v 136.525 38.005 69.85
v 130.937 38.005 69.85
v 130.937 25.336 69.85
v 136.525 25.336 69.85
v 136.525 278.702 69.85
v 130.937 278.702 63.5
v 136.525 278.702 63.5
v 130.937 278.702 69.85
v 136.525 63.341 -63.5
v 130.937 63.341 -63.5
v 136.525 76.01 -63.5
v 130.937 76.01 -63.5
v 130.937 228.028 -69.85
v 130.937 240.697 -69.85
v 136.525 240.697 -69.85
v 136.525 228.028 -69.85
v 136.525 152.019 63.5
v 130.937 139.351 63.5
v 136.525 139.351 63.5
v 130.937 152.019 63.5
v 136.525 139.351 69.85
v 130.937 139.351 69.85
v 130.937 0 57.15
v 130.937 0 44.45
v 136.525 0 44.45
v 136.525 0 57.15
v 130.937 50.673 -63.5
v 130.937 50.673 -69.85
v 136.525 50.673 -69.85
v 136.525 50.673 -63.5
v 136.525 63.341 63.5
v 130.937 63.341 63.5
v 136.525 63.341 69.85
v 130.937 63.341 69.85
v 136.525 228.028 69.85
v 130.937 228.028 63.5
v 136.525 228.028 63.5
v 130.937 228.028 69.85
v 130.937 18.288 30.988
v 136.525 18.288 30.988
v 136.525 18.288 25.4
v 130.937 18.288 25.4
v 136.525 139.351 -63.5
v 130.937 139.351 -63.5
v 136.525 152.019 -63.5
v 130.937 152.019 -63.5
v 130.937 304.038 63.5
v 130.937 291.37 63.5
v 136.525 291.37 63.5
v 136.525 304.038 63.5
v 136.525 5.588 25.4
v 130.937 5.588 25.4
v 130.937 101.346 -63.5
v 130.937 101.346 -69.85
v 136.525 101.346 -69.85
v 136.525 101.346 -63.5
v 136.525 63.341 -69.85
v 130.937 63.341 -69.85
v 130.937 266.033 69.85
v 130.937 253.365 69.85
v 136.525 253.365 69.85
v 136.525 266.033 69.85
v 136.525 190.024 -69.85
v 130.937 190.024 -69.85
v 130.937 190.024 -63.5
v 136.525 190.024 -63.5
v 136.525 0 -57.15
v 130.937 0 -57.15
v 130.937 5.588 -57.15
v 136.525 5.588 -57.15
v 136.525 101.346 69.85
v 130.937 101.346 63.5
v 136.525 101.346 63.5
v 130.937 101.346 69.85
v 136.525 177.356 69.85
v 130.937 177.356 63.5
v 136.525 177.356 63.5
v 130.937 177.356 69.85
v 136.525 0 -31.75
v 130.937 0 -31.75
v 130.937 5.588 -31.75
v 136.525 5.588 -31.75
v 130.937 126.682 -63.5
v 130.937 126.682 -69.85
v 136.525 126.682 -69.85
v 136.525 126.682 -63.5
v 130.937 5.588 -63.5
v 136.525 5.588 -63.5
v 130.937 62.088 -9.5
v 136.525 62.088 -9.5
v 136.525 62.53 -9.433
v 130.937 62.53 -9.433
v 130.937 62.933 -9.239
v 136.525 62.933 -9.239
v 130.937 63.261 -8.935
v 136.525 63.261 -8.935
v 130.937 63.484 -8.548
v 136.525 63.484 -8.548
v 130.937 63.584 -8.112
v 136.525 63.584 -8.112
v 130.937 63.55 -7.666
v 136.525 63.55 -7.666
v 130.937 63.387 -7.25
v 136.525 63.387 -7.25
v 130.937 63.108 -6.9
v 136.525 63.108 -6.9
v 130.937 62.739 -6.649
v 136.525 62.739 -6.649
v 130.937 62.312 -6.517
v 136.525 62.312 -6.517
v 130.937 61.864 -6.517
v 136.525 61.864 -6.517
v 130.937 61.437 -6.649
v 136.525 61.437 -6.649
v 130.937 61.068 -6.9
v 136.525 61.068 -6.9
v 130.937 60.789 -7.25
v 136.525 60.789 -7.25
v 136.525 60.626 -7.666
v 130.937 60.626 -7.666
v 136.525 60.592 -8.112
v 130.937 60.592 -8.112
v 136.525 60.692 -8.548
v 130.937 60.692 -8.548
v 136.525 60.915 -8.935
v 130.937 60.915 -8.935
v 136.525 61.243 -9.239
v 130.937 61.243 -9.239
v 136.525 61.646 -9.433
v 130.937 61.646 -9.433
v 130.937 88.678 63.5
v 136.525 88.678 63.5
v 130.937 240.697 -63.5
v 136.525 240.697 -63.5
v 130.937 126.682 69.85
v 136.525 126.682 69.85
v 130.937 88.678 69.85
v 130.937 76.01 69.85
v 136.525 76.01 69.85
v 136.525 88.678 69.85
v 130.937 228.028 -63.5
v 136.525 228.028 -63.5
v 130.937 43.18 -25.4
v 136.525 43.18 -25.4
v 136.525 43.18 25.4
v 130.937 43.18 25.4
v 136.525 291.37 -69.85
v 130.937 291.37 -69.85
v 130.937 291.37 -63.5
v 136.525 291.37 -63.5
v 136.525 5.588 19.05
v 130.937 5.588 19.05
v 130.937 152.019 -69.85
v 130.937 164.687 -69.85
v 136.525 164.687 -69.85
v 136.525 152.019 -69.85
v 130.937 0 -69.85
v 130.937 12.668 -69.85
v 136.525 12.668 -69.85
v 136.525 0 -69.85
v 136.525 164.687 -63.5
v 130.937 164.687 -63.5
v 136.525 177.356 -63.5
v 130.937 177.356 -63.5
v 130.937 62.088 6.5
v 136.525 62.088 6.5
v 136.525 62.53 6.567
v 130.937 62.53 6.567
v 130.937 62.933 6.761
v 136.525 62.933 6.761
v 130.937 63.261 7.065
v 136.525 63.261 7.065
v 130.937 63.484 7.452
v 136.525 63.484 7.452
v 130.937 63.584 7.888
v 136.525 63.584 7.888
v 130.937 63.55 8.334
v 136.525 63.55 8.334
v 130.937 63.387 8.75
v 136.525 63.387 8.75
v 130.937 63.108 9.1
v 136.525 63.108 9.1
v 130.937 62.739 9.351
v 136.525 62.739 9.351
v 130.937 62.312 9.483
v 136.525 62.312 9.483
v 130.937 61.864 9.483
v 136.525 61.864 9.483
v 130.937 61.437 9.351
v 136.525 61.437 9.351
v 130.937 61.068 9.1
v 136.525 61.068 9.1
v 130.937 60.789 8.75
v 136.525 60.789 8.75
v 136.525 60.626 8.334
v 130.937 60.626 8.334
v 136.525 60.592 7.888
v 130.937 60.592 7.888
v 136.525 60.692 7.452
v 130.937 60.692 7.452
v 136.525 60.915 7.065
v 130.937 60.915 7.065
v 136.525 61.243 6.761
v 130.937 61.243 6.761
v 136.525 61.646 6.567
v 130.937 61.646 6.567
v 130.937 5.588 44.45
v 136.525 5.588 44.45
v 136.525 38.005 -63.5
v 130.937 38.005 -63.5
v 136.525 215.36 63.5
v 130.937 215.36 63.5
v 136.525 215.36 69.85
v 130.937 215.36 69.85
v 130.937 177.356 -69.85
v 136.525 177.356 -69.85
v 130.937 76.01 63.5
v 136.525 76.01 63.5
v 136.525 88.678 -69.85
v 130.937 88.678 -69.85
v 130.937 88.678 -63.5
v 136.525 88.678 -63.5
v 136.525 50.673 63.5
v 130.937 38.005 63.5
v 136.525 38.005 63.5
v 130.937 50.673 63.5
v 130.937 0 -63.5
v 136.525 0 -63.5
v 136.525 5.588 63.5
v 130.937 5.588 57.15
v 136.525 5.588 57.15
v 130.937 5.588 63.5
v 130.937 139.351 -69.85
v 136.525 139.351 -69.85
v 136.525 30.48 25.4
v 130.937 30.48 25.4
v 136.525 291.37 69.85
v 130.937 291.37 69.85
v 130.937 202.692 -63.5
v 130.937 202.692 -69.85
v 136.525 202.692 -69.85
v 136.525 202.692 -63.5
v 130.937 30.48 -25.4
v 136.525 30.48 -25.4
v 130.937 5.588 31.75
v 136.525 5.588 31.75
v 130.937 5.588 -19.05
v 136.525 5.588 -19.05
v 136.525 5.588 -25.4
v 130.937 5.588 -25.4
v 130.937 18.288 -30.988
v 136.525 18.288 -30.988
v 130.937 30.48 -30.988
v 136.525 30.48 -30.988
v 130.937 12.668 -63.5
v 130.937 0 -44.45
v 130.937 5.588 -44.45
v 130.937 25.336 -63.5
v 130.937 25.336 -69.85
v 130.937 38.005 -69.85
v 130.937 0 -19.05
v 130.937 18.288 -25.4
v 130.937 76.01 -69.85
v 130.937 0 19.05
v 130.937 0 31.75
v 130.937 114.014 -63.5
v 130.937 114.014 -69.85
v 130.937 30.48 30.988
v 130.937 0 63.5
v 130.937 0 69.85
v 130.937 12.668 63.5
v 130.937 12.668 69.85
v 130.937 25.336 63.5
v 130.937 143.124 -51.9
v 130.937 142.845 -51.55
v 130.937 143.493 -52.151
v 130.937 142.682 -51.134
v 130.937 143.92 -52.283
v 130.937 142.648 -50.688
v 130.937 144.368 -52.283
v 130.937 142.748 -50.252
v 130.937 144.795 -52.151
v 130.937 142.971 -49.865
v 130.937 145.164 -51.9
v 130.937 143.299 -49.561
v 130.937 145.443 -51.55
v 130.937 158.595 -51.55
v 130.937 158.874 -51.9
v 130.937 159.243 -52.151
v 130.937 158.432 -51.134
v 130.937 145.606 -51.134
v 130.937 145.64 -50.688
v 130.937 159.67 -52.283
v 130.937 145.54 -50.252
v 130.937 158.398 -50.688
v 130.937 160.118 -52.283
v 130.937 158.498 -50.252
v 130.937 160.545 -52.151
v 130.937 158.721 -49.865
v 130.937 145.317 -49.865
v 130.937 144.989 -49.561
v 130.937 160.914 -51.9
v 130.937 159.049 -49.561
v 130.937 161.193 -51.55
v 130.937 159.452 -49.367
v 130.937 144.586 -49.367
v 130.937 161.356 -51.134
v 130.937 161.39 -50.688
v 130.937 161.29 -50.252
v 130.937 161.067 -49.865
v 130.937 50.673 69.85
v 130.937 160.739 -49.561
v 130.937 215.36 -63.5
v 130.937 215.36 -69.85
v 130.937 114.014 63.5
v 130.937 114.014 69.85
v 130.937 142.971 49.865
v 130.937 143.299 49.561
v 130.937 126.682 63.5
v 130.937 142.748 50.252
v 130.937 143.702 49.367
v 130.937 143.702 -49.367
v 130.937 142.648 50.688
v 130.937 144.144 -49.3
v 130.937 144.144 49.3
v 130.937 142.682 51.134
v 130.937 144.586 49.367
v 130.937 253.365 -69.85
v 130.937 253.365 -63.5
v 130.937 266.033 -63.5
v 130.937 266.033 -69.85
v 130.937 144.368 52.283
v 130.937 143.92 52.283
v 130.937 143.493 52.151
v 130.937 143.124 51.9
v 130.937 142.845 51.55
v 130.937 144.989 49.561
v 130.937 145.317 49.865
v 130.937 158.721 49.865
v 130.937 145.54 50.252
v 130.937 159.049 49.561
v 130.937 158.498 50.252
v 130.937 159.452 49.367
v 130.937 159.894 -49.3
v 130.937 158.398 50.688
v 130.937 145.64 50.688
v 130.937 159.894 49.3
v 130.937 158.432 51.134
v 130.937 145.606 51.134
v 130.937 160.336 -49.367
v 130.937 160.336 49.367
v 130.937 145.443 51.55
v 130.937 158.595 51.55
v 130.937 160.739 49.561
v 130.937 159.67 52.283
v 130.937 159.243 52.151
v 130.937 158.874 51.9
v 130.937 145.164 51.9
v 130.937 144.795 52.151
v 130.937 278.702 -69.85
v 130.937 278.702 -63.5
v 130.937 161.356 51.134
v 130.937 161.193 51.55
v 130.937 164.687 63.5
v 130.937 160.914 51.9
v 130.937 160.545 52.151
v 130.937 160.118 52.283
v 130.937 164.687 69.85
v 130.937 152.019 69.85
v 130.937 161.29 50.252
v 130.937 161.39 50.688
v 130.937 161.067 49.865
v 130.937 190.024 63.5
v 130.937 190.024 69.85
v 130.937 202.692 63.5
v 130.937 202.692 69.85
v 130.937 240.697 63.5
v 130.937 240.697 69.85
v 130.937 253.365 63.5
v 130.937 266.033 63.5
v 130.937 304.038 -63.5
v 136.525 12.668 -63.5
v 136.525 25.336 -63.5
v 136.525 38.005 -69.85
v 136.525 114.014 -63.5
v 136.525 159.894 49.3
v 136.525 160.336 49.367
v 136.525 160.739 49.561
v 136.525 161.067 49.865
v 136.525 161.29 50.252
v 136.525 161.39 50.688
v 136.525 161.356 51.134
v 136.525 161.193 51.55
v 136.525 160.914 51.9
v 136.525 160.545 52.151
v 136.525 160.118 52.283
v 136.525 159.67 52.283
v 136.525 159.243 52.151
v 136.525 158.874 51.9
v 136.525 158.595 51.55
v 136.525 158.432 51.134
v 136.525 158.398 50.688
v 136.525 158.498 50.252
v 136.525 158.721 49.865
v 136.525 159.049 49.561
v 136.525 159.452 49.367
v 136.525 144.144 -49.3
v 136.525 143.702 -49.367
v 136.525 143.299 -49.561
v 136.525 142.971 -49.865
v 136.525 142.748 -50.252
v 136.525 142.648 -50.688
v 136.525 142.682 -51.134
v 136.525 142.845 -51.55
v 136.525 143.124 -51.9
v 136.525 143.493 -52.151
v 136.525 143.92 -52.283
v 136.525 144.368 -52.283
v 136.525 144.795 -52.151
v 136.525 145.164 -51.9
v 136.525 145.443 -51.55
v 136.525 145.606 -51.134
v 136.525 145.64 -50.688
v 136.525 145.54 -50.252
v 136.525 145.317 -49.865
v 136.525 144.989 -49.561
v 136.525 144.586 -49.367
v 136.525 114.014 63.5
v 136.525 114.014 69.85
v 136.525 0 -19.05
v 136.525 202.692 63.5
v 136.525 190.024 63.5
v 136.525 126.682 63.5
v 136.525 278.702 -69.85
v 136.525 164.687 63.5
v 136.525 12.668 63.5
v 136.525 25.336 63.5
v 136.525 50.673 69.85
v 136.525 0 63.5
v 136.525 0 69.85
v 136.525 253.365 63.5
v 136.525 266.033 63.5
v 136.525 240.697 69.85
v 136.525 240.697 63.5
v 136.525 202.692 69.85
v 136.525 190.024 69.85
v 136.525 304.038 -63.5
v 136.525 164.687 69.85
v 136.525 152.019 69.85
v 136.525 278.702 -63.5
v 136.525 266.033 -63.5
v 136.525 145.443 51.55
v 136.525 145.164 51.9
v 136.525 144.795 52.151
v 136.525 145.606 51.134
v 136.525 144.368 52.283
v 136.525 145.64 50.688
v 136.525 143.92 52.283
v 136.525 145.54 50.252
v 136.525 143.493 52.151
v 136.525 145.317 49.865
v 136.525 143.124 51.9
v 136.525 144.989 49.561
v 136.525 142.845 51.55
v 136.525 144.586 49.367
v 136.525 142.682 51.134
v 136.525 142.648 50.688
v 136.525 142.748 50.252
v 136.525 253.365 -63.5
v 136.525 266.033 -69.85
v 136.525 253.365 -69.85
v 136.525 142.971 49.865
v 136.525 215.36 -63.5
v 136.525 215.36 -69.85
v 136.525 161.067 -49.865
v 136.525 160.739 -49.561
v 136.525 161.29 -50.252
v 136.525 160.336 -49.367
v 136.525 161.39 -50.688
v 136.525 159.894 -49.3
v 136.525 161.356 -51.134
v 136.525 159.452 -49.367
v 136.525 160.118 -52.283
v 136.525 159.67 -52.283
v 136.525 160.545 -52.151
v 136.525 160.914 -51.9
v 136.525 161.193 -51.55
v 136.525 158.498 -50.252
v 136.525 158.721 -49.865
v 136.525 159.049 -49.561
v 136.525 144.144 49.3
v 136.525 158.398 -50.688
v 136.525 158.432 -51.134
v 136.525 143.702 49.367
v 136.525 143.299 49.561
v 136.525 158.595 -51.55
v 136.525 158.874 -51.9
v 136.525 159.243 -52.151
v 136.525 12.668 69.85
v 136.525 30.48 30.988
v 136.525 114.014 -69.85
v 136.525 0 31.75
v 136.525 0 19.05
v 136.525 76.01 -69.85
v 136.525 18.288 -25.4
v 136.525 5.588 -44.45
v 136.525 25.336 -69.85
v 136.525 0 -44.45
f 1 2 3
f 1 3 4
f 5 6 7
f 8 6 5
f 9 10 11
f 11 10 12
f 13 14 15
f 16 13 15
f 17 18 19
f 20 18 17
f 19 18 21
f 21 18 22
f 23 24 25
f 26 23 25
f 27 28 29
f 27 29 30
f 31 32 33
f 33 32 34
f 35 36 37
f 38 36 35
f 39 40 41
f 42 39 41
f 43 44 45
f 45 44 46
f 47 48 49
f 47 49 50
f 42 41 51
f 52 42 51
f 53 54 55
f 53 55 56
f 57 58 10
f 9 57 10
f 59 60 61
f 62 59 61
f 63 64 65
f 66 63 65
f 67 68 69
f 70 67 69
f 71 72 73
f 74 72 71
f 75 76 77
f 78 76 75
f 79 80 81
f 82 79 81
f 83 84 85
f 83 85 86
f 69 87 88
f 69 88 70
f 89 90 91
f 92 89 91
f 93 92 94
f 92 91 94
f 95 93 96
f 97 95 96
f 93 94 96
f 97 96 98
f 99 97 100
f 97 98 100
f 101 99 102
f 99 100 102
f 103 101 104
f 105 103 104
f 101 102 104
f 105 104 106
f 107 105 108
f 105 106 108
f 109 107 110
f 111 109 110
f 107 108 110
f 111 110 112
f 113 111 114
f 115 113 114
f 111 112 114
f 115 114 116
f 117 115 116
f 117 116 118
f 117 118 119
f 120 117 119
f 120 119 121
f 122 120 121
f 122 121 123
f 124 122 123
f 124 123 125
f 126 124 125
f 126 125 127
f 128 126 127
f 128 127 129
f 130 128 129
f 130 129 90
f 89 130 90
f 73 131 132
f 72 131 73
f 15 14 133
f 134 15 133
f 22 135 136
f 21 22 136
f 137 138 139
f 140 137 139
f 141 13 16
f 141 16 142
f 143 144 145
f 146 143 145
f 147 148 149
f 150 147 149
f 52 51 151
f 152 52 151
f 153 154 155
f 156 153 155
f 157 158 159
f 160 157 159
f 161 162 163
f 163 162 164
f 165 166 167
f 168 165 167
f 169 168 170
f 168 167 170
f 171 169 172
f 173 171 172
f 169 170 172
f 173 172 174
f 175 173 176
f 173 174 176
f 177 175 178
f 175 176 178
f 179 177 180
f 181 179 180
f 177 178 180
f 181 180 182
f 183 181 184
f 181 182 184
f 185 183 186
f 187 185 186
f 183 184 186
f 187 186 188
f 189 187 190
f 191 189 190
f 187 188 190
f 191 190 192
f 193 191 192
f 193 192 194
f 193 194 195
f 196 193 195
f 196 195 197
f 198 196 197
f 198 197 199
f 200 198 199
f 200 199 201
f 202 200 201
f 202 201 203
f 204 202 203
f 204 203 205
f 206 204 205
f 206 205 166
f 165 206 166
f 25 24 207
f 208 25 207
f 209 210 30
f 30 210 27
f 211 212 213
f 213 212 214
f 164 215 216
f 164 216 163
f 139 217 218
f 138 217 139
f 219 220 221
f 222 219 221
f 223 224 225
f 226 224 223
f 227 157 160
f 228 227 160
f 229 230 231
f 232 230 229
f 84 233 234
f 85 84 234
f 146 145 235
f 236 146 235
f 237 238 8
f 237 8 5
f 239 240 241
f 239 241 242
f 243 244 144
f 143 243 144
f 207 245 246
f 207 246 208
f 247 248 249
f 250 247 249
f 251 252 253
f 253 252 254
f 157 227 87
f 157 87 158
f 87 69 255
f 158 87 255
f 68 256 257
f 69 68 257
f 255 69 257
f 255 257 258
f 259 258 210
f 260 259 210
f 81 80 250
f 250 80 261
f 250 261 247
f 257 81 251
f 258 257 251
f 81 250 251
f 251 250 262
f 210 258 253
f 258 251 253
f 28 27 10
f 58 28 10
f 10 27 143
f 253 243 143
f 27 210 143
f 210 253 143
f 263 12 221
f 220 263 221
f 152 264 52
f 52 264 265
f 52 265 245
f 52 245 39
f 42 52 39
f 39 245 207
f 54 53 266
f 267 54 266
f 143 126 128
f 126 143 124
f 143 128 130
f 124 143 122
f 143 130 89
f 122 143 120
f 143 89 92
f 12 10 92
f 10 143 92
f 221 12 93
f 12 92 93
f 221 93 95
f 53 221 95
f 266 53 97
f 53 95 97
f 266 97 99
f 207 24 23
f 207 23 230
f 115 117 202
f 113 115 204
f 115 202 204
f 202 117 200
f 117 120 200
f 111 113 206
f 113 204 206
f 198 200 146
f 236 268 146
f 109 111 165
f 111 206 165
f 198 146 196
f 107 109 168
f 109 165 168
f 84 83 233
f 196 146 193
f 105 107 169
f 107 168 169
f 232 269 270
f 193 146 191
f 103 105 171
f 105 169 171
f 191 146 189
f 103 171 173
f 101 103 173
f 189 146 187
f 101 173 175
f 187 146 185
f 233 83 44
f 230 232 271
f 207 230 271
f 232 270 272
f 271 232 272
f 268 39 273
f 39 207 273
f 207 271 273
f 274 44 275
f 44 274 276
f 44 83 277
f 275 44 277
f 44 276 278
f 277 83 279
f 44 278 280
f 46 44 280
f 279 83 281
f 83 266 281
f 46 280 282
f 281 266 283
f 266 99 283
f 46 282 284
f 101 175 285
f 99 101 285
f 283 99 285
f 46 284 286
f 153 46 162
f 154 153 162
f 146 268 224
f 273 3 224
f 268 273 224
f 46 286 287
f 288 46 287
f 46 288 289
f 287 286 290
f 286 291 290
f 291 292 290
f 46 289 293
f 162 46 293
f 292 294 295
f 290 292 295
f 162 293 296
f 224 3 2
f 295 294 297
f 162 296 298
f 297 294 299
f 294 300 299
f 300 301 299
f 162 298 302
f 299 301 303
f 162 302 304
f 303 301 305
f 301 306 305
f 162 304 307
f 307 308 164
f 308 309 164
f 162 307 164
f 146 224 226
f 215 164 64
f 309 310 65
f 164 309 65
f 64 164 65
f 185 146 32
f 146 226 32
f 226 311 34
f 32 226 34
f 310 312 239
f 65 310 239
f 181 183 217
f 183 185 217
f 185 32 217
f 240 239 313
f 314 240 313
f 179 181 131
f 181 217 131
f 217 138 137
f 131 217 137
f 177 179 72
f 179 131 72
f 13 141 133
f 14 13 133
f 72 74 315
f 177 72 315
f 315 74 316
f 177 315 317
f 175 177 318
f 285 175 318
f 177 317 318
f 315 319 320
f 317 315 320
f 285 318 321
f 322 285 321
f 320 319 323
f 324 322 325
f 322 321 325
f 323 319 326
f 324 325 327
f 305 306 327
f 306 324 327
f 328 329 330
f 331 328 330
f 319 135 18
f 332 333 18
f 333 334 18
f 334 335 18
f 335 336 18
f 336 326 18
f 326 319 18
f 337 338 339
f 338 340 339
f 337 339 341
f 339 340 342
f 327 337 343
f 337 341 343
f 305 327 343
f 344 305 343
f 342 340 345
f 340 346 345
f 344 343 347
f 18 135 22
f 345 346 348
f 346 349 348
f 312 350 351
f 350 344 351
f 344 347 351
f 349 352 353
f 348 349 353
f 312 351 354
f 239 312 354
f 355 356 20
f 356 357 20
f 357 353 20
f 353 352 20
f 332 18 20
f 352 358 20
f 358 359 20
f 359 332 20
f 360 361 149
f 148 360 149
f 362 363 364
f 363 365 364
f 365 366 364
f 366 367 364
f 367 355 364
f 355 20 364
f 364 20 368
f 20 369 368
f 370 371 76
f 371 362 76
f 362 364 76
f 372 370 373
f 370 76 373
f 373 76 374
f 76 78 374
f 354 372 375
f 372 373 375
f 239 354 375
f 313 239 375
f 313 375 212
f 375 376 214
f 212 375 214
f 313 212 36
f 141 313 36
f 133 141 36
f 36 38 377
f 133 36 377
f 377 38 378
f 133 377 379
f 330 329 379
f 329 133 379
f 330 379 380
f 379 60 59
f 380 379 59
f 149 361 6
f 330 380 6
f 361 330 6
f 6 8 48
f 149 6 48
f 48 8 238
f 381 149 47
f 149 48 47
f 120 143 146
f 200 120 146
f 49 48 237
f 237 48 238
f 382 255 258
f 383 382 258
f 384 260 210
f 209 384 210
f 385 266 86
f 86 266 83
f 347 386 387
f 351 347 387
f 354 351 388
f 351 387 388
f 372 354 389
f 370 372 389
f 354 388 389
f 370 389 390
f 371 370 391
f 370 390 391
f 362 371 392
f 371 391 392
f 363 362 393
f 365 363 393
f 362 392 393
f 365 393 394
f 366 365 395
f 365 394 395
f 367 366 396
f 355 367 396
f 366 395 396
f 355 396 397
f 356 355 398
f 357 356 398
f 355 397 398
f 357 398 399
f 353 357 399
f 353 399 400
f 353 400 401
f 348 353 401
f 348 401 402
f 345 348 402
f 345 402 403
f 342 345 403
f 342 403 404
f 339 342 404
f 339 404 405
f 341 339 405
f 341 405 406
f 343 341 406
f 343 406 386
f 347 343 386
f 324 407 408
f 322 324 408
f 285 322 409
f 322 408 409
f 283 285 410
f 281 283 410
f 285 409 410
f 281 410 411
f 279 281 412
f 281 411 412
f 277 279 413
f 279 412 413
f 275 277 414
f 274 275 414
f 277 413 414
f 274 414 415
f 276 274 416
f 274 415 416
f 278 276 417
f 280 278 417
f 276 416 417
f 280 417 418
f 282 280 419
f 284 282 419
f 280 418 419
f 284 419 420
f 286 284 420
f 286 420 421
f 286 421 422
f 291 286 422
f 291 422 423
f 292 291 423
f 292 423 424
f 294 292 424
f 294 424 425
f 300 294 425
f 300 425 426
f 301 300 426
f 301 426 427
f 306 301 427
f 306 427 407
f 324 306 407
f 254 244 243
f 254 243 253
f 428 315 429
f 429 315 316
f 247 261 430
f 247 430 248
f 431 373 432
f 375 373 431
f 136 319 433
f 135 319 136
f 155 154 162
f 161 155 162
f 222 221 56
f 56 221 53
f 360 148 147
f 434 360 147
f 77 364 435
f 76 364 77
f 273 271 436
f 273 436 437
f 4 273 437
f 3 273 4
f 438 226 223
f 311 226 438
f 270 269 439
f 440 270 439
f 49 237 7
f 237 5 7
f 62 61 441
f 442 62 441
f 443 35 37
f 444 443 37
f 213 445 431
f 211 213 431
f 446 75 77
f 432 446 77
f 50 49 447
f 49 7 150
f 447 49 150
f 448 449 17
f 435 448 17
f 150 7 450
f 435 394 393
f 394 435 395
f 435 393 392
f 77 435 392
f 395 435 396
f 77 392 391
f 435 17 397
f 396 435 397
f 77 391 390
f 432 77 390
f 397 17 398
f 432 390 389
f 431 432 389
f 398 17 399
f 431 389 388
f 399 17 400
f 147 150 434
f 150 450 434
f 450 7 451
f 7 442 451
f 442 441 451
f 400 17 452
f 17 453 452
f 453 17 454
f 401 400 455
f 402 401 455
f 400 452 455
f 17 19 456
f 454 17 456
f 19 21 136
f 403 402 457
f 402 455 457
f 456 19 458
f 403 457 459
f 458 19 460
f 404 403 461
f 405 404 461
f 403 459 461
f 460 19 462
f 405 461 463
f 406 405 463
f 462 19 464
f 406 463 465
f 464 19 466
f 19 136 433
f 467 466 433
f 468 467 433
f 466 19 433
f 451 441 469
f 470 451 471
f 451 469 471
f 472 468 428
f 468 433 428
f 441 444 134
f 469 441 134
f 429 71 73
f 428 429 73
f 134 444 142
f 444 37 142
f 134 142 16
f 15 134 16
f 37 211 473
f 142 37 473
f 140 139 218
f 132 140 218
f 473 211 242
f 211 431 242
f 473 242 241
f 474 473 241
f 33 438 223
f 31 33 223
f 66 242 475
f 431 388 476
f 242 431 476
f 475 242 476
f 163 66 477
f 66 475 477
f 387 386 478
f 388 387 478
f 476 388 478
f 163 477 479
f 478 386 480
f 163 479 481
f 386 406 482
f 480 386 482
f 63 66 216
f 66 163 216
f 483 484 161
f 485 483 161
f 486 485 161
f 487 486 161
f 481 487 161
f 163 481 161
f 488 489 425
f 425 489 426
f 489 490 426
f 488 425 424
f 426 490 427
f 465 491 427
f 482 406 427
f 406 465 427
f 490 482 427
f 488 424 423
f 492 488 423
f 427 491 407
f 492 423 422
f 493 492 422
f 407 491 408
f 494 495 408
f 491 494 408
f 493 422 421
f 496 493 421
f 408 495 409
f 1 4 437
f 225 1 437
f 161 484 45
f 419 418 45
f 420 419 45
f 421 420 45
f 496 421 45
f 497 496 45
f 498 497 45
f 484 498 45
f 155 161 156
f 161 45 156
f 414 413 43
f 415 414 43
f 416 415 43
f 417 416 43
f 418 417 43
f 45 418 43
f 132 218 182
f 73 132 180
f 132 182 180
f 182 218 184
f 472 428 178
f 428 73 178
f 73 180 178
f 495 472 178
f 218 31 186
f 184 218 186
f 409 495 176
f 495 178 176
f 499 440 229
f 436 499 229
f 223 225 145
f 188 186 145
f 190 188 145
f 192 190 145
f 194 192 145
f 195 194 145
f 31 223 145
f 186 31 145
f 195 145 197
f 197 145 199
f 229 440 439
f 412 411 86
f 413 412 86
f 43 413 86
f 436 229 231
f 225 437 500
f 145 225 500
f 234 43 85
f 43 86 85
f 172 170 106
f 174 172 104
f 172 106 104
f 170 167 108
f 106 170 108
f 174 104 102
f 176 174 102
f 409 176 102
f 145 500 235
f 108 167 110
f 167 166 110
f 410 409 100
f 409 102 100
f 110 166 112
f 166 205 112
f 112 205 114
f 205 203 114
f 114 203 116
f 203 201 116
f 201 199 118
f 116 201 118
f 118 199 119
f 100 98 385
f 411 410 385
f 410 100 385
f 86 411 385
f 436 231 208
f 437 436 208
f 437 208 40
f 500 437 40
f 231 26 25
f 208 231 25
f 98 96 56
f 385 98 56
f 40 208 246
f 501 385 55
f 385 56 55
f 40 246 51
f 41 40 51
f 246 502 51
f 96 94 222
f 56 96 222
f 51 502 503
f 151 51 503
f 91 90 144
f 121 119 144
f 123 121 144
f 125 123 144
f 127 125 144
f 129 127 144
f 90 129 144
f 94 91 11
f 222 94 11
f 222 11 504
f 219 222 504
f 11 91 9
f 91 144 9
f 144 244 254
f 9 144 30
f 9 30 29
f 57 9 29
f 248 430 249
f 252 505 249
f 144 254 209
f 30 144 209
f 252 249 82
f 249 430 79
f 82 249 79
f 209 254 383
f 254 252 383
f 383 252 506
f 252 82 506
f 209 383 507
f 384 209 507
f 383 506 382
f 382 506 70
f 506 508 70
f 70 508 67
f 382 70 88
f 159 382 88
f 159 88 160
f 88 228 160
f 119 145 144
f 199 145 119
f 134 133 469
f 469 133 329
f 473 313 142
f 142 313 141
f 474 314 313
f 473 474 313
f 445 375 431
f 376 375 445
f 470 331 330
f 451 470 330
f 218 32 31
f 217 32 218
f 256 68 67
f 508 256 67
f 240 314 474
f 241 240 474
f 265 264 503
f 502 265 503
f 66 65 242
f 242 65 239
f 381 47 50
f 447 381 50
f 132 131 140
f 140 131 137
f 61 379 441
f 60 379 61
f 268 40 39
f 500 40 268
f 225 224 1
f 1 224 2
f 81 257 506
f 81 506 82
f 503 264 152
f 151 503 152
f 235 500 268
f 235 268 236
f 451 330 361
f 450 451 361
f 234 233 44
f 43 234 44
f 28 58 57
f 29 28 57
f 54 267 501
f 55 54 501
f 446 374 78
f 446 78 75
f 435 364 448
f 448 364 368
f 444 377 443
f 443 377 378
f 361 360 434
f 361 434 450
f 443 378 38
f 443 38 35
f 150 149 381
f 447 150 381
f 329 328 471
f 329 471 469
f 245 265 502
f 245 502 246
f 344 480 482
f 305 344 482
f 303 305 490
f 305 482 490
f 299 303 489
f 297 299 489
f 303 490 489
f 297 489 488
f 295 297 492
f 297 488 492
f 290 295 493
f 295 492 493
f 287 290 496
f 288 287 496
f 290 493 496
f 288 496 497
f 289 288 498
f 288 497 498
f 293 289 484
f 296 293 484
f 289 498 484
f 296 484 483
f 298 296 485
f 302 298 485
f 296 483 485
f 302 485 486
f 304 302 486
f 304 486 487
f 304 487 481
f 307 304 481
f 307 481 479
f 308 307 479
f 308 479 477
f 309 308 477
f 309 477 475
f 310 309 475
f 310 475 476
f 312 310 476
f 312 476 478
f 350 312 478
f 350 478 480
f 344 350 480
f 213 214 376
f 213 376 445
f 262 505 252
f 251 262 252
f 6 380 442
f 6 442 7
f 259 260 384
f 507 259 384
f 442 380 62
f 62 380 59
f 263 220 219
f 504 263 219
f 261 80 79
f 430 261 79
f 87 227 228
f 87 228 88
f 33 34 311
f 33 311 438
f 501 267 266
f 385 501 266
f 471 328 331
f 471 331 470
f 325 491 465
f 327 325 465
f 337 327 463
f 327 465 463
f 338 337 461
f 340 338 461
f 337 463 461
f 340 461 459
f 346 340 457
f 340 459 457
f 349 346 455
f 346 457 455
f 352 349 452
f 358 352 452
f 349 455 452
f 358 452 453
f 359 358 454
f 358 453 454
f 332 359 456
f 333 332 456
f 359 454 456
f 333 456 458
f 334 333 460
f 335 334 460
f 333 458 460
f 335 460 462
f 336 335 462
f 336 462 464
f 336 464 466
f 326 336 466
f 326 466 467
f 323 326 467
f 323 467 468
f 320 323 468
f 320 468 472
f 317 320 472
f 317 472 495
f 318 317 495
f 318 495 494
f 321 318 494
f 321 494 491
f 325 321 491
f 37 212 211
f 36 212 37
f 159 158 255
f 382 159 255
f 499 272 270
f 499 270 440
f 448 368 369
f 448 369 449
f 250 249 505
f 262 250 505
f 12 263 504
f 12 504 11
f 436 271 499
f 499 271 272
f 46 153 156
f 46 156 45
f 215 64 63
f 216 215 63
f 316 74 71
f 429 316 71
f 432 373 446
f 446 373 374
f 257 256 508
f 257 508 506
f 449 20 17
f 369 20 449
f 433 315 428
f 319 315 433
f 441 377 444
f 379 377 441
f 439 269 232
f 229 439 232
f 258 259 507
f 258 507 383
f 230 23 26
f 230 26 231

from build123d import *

# Parameters (mm, degrees)
SKETCH1_W              = 273.05
SKETCH1_H              = 139.7
BOSS_EXTRUDE1_DEPTH    = 5.588
SKETCH2_W              = 273.05
SKETCH2_H              = 139.7
SKETCH2_W_2            = 261.874
SKETCH2_H_2            = 128.524
BOSS_EXTRUDE2_DEPTH    = 298.45
SKETCH3_W              = 6.35
SKETCH3_H              = 16.933333333
SKETCH3_H_2            = 16.933333334
DOOR_SLOT_DEPTH        = 12.7
DOOR_GUIDE_HOLES_REACH = 361.255
SKETCH4_W              = 6.35
SKETCH4_H              = 15.875
LEVER_HOLES_W          = 9.652
LEVER_HOLES_H          = 6.35
LEVER_HOLES_W_2        = 6.35
CUT_EXTRUDE1_DEPTH     = 362.378293578
CUT_EXTRUDE3_REACH     = 416.577
SKETCH8_R              = 3.175
SKETCH16_W             = 327.238778096
SKETCH16_H             = 314.471565403
CUT_EXTRUDE10_DEPTH    = 362.378293578
LEFT_RIGHT_W           = 6.35
LEFT_RIGHT_H           = 5.588
LEFT_RIGHT_W_2         = 12.7
LEFT_RIGHT_H_2         = 12.66825
CUT_EXTRUDE11_DEPTH    = 415.577411883
SKETCH17_R             = 1.5
SKETCH17_W             = 23
SKETCH17_H             = 17.61800007
CUT_EXTRUDE12_DEPTH    = 313.00857951
SKETCH18_W             = 5.588
SKETCH18_H             = 12.192
CUT_EXTRUDE13_DEPTH    = 313.00857951


with BuildPart() as part:
    # Sketch1 → Boss-Extrude1 (new body)
    with BuildSketch(Plane(origin=(0, 0, 0), x_dir=(1, 0, 0), z_dir=(0, 1, 0))):
        Rectangle(SKETCH1_W, SKETCH1_H)
    extrude(amount=BOSS_EXTRUDE1_DEPTH)

    # Sketch2 → Boss-Extrude2 (add)
    with BuildSketch(Plane(origin=(0, 5.588, 0), x_dir=(1, 0, 0), z_dir=(0, 1, 0))):
        Rectangle(SKETCH2_W, SKETCH2_H)
        Rectangle(SKETCH2_W_2, SKETCH2_H_2, mode=Mode.SUBTRACT)
    extrude(amount=BOSS_EXTRUDE2_DEPTH)

    # Sketch3 → Door Slot (cut)
    with BuildSketch(Plane.XY.offset(69.85)):
        with BuildLine():
            Line((-29.337, 282.448), (-29.337, 5.588))
            Line((-29.337, 5.588), (-22.733, 5.588))
            Line((-22.733, 5.588), (-22.733, 291.592))
            Line((-22.733, 291.592), (-42.291, 291.592))
            Line((-42.291, 291.592), (-42.291, 284.988))
            Line((-42.291, 284.988), (-31.877, 284.988))
            ThreePointArc((-31.877, 284.988), (-30.080948776, 284.244051224), (-29.337, 282.448))
        make_face()
        with Locations((-13.208, 80.433333334)):
            Rectangle(SKETCH3_W, SKETCH3_H)
        with Locations((-13.208, 50.8)):
            Rectangle(SKETCH3_W, SKETCH3_H_2)
        with Locations((-13.208, 21.166666667)):
            Rectangle(SKETCH3_W, SKETCH3_H)
    extrude(amount=-DOOR_SLOT_DEPTH, mode=Mode.SUBTRACT)

    # Sketch4 → Door Guide Holes (cut, up to next)
    with BuildSketch(Plane.XY.offset(-64.262), mode=Mode.PRIVATE) as door_guide_holes_sk1:
        with Locations((-45.466, 283.4005)):
            Rectangle(SKETCH4_W, SKETCH4_H)
    door_guide_holes_tool1 = extrude(door_guide_holes_sk1.sketch, amount=-DOOR_GUIDE_HOLES_REACH, mode=Mode.PRIVATE) & part.part
    # Sketch4 → Door Guide Holes (cut, up to next)
    with BuildSketch(Plane.XY.offset(-64.262), mode=Mode.PRIVATE) as door_guide_holes_sk2:
        with Locations((-45.466, 254.8255)):
            Rectangle(SKETCH4_W, SKETCH4_H)
    door_guide_holes_tool2 = extrude(door_guide_holes_sk2.sketch, amount=-DOOR_GUIDE_HOLES_REACH, mode=Mode.PRIVATE) & part.part
    # Sketch4 → Door Guide Holes (cut, up to next)
    with BuildSketch(Plane.XY.offset(-64.262), mode=Mode.PRIVATE) as door_guide_holes_sk3:
        with Locations((-45.466, 226.2505)):
            Rectangle(SKETCH4_W, SKETCH4_H)
    door_guide_holes_tool3 = extrude(door_guide_holes_sk3.sketch, amount=-DOOR_GUIDE_HOLES_REACH, mode=Mode.PRIVATE) & part.part
    # Sketch4 → Door Guide Holes (cut, up to next)
    with BuildSketch(Plane.XY.offset(-64.262), mode=Mode.PRIVATE) as door_guide_holes_sk4:
        with Locations((-45.466, 197.6755)):
            Rectangle(SKETCH4_W, SKETCH4_H)
    door_guide_holes_tool4 = extrude(door_guide_holes_sk4.sketch, amount=-DOOR_GUIDE_HOLES_REACH, mode=Mode.PRIVATE) & part.part
    # Sketch4 → Door Guide Holes (cut, up to next)
    with BuildSketch(Plane.XY.offset(-64.262), mode=Mode.PRIVATE) as door_guide_holes_sk5:
        with Locations((-45.466, 169.1005)):
            Rectangle(SKETCH4_W, SKETCH4_H)
    door_guide_holes_tool5 = extrude(door_guide_holes_sk5.sketch, amount=-DOOR_GUIDE_HOLES_REACH, mode=Mode.PRIVATE) & part.part
    # Sketch4 → Door Guide Holes (cut, up to next)
    with BuildSketch(Plane.XY.offset(-64.262), mode=Mode.PRIVATE) as door_guide_holes_sk6:
        with Locations((-45.466, 140.5255)):
            Rectangle(SKETCH4_W, SKETCH4_H)
    door_guide_holes_tool6 = extrude(door_guide_holes_sk6.sketch, amount=-DOOR_GUIDE_HOLES_REACH, mode=Mode.PRIVATE) & part.part
    # Sketch4 → Door Guide Holes (cut, up to next)
    with BuildSketch(Plane.XY.offset(-64.262), mode=Mode.PRIVATE) as door_guide_holes_sk7:
        with Locations((-45.466, 111.9505)):
            Rectangle(SKETCH4_W, SKETCH4_H)
    door_guide_holes_tool7 = extrude(door_guide_holes_sk7.sketch, amount=-DOOR_GUIDE_HOLES_REACH, mode=Mode.PRIVATE) & part.part
    # Sketch4 → Door Guide Holes (cut, up to next)
    with BuildSketch(Plane.XY.offset(-64.262), mode=Mode.PRIVATE) as door_guide_holes_sk8:
        with Locations((-45.466, 83.3755)):
            Rectangle(SKETCH4_W, SKETCH4_H)
    door_guide_holes_tool8 = extrude(door_guide_holes_sk8.sketch, amount=-DOOR_GUIDE_HOLES_REACH, mode=Mode.PRIVATE) & part.part
    # Sketch4 → Door Guide Holes (cut, up to next)
    with BuildSketch(Plane.XY.offset(-64.262), mode=Mode.PRIVATE) as door_guide_holes_sk9:
        with Locations((-45.466, 54.8005)):
            Rectangle(SKETCH4_W, SKETCH4_H)
    door_guide_holes_tool9 = extrude(door_guide_holes_sk9.sketch, amount=-DOOR_GUIDE_HOLES_REACH, mode=Mode.PRIVATE) & part.part
    # Sketch4 → Door Guide Holes (cut, up to next)
    with BuildSketch(Plane.XY.offset(-64.262), mode=Mode.PRIVATE) as door_guide_holes_sk10:
        with Locations((-45.466, 26.2255)):
            Rectangle(SKETCH4_W, SKETCH4_H)
    door_guide_holes_tool10 = extrude(door_guide_holes_sk10.sketch, amount=-DOOR_GUIDE_HOLES_REACH, mode=Mode.PRIVATE) & part.part
    door_guide_holes_1 = door_guide_holes_tool1.solids().sort_by_distance((-45.466, 283.4005, -64.262))[0]
    add(door_guide_holes_1, mode=Mode.SUBTRACT)
    door_guide_holes_2 = door_guide_holes_tool2.solids().sort_by_distance((-45.466, 254.8255, -64.262))[0]
    add(door_guide_holes_2, mode=Mode.SUBTRACT)
    door_guide_holes_3 = door_guide_holes_tool3.solids().sort_by_distance((-45.466, 226.2505, -64.262))[0]
    add(door_guide_holes_3, mode=Mode.SUBTRACT)
    door_guide_holes_4 = door_guide_holes_tool4.solids().sort_by_distance((-45.466, 197.6755, -64.262))[0]
    add(door_guide_holes_4, mode=Mode.SUBTRACT)
    door_guide_holes_5 = door_guide_holes_tool5.solids().sort_by_distance((-45.466, 169.1005, -64.262))[0]
    add(door_guide_holes_5, mode=Mode.SUBTRACT)
    door_guide_holes_6 = door_guide_holes_tool6.solids().sort_by_distance((-45.466, 140.5255, -64.262))[0]
    add(door_guide_holes_6, mode=Mode.SUBTRACT)
    door_guide_holes_7 = door_guide_holes_tool7.solids().sort_by_distance((-45.466, 111.9505, -64.262))[0]
    add(door_guide_holes_7, mode=Mode.SUBTRACT)
    door_guide_holes_8 = door_guide_holes_tool8.solids().sort_by_distance((-45.466, 83.3755, -64.262))[0]
    add(door_guide_holes_8, mode=Mode.SUBTRACT)
    door_guide_holes_9 = door_guide_holes_tool9.solids().sort_by_distance((-45.466, 54.8005, -64.262))[0]
    add(door_guide_holes_9, mode=Mode.SUBTRACT)
    door_guide_holes_10 = door_guide_holes_tool10.solids().sort_by_distance((-45.466, 26.2255, -64.262))[0]
    add(door_guide_holes_10, mode=Mode.SUBTRACT)
    door_guide_holes = door_guide_holes_1 + door_guide_holes_2 + door_guide_holes_3 + door_guide_holes_4 + door_guide_holes_5 + door_guide_holes_6 + door_guide_holes_7 + door_guide_holes_8 + door_guide_holes_9 + door_guide_holes_10  # Door Guide Holes as one shape, for the pattern or mirror that repeats it

    # Mirror1: Door Guide Holes across plane
    add(door_guide_holes.mirror(Plane.ZY.offset(32.512)), mode=Mode.SUBTRACT)

    # Lever Holes → Cut-Extrude1 (cut, through all)
    with BuildSketch(Plane.XY.offset(69.85)):
        with Locations((54.102, 28.575)):
            Rectangle(LEVER_HOLES_W, LEVER_HOLES_H)
        with Locations((39.3065, 15.875)):
            Rectangle(LEVER_HOLES_W_2, LEVER_HOLES_H)
        with Locations((68.8975, 15.875)):
            Rectangle(LEVER_HOLES_W_2, LEVER_HOLES_H)
    extrude(amount=-CUT_EXTRUDE1_DEPTH, mode=Mode.SUBTRACT)

    # Sketch8 → Cut-Extrude3 (cut, up to next)
    with BuildSketch(Plane.ZY.offset(136.525), mode=Mode.PRIVATE) as cut_extrude3_sk1:
        with Locations((0, 19.05)):
            Circle(SKETCH8_R)
    cut_extrude3_tool1 = extrude(cut_extrude3_sk1.sketch, amount=-CUT_EXTRUDE3_REACH, mode=Mode.PRIVATE) & part.part
    add(cut_extrude3_tool1.solids().sort_by_distance((-136.525, 19.05, 0))[0], mode=Mode.SUBTRACT)

    # Sketch16 → Cut-Extrude10 (cut, through all)
    with BuildSketch(Plane.XY.offset(69.85)):
        with Locations((-32.682389048, 146.802217299)):
            Rectangle(SKETCH16_W, SKETCH16_H)
    extrude(amount=-CUT_EXTRUDE10_DEPTH, mode=Mode.SUBTRACT)

    # Left/Right → Cut-Extrude11 (cut, through all)
    with BuildSketch(Plane.ZY.offset(136.525)):
        with Locations((60.325, 2.794)):
            Rectangle(LEFT_RIGHT_W, LEFT_RIGHT_H)
        with Locations((38.1, 2.794)):
            Rectangle(LEFT_RIGHT_W_2, LEFT_RIGHT_H)
        with Locations((66.675, 19.002375)):
            Rectangle(LEFT_RIGHT_W, LEFT_RIGHT_H_2)
        with Locations((12.7, 2.794)):
            Rectangle(LEFT_RIGHT_W_2, LEFT_RIGHT_H)
        with Locations((66.675, 44.338875)):
            Rectangle(LEFT_RIGHT_W, LEFT_RIGHT_H_2)
        with Locations((-12.7, 2.794)):
            Rectangle(LEFT_RIGHT_W_2, LEFT_RIGHT_H)
        with Locations((66.675, 69.675375)):
            Rectangle(LEFT_RIGHT_W, LEFT_RIGHT_H_2)
        with Locations((-38.1, 2.794)):
            Rectangle(LEFT_RIGHT_W_2, LEFT_RIGHT_H)
        with Locations((66.675, 95.011875)):
            Rectangle(LEFT_RIGHT_W, LEFT_RIGHT_H_2)
        with Locations((-60.325, 2.794)):
            Rectangle(LEFT_RIGHT_W, LEFT_RIGHT_H)
        with Locations((66.675, 120.348375)):
            Rectangle(LEFT_RIGHT_W, LEFT_RIGHT_H_2)
        with Locations((-66.675, 19.002375)):
            Rectangle(LEFT_RIGHT_W, LEFT_RIGHT_H_2)
        with Locations((66.675, 145.684875)):
            Rectangle(LEFT_RIGHT_W, LEFT_RIGHT_H_2)
        with Locations((-66.675, 44.338875)):
            Rectangle(LEFT_RIGHT_W, LEFT_RIGHT_H_2)
        with Locations((66.675, 171.021375)):
            Rectangle(LEFT_RIGHT_W, LEFT_RIGHT_H_2)
        with Locations((-66.675, 69.675375)):
            Rectangle(LEFT_RIGHT_W, LEFT_RIGHT_H_2)
        with Locations((66.675, 196.357875)):
            Rectangle(LEFT_RIGHT_W, LEFT_RIGHT_H_2)
        with Locations((-66.675, 95.011875)):
            Rectangle(LEFT_RIGHT_W, LEFT_RIGHT_H_2)
        with Locations((66.675, 221.694375)):
            Rectangle(LEFT_RIGHT_W, LEFT_RIGHT_H_2)
        with Locations((-66.675, 120.348375)):
            Rectangle(LEFT_RIGHT_W, LEFT_RIGHT_H_2)
        with Locations((66.675, 247.030875)):
            Rectangle(LEFT_RIGHT_W, LEFT_RIGHT_H_2)
        with Locations((-66.675, 145.684875)):
            Rectangle(LEFT_RIGHT_W, LEFT_RIGHT_H_2)
        with Locations((66.675, 272.367375)):
            Rectangle(LEFT_RIGHT_W, LEFT_RIGHT_H_2)
        with Locations((-66.675, 171.021375)):
            Rectangle(LEFT_RIGHT_W, LEFT_RIGHT_H_2)
        with Locations((66.675, 297.703875)):
            Rectangle(LEFT_RIGHT_W, LEFT_RIGHT_H_2)
        with Locations((-66.675, 196.357875)):
            Rectangle(LEFT_RIGHT_W, LEFT_RIGHT_H_2)
        with Locations((-66.675, 221.694375)):
            Rectangle(LEFT_RIGHT_W, LEFT_RIGHT_H_2)
        with Locations((-66.675, 247.030875)):
            Rectangle(LEFT_RIGHT_W, LEFT_RIGHT_H_2)
        with Locations((-66.675, 272.367375)):
            Rectangle(LEFT_RIGHT_W, LEFT_RIGHT_H_2)
        with Locations((-66.675, 297.703875)):
            Rectangle(LEFT_RIGHT_W, LEFT_RIGHT_H_2)
    extrude(amount=-CUT_EXTRUDE11_DEPTH, mode=Mode.SUBTRACT)

    # Sketch17 → Cut-Extrude12 (cut, through all)
    with BuildSketch(Plane(origin=(136.525, 0, 0), x_dir=(0, 0, -1), z_dir=(1, 0, 0))):
        with Locations((-8, 62.088)):
            Circle(SKETCH17_R)
        with Locations((8, 62.088)):
            Circle(SKETCH17_R)
        with Locations((-50.8, 159.894)):
            Circle(SKETCH17_R)
        with Locations((-50.8, 144.144)):
            Circle(SKETCH17_R)
        with Locations(Location((50.8, 144.144, 0), (0, 0, 180))):
            Circle(SKETCH17_R)
        with Locations(Location((50.8, 159.894, 0), (0, 0, 180))):
            Circle(SKETCH17_R)
        with Locations((0, 22.779000035)):
            Rectangle(SKETCH17_W, SKETCH17_H)
    extrude(amount=-CUT_EXTRUDE12_DEPTH, mode=Mode.SUBTRACT)

    # Sketch18 → Cut-Extrude13 (cut, through all)
    with BuildSketch(Plane(origin=(136.525, 0, 0), x_dir=(0, 0, -1), z_dir=(1, 0, 0))):
        with Locations((-28.194, 24.384)):
            Rectangle(SKETCH18_W, SKETCH18_H)
        with Locations((28.194, 24.384)):
            Rectangle(SKETCH18_W, SKETCH18_H)
        Polygon((25.4, 30.48), (25.4, 43.18), (-25.4, 43.18), (-25.4, 30.48), (-25.4, 18.288), (-25.4, 5.588), (-6.35, 5.588), (-6.35, 0), (6.35, 0), (6.35, 5.588), (25.4, 5.588), (25.4, 18.288), align=None)
    extrude(amount=-CUT_EXTRUDE13_DEPTH, mode=Mode.SUBTRACT)


solid = part.part
